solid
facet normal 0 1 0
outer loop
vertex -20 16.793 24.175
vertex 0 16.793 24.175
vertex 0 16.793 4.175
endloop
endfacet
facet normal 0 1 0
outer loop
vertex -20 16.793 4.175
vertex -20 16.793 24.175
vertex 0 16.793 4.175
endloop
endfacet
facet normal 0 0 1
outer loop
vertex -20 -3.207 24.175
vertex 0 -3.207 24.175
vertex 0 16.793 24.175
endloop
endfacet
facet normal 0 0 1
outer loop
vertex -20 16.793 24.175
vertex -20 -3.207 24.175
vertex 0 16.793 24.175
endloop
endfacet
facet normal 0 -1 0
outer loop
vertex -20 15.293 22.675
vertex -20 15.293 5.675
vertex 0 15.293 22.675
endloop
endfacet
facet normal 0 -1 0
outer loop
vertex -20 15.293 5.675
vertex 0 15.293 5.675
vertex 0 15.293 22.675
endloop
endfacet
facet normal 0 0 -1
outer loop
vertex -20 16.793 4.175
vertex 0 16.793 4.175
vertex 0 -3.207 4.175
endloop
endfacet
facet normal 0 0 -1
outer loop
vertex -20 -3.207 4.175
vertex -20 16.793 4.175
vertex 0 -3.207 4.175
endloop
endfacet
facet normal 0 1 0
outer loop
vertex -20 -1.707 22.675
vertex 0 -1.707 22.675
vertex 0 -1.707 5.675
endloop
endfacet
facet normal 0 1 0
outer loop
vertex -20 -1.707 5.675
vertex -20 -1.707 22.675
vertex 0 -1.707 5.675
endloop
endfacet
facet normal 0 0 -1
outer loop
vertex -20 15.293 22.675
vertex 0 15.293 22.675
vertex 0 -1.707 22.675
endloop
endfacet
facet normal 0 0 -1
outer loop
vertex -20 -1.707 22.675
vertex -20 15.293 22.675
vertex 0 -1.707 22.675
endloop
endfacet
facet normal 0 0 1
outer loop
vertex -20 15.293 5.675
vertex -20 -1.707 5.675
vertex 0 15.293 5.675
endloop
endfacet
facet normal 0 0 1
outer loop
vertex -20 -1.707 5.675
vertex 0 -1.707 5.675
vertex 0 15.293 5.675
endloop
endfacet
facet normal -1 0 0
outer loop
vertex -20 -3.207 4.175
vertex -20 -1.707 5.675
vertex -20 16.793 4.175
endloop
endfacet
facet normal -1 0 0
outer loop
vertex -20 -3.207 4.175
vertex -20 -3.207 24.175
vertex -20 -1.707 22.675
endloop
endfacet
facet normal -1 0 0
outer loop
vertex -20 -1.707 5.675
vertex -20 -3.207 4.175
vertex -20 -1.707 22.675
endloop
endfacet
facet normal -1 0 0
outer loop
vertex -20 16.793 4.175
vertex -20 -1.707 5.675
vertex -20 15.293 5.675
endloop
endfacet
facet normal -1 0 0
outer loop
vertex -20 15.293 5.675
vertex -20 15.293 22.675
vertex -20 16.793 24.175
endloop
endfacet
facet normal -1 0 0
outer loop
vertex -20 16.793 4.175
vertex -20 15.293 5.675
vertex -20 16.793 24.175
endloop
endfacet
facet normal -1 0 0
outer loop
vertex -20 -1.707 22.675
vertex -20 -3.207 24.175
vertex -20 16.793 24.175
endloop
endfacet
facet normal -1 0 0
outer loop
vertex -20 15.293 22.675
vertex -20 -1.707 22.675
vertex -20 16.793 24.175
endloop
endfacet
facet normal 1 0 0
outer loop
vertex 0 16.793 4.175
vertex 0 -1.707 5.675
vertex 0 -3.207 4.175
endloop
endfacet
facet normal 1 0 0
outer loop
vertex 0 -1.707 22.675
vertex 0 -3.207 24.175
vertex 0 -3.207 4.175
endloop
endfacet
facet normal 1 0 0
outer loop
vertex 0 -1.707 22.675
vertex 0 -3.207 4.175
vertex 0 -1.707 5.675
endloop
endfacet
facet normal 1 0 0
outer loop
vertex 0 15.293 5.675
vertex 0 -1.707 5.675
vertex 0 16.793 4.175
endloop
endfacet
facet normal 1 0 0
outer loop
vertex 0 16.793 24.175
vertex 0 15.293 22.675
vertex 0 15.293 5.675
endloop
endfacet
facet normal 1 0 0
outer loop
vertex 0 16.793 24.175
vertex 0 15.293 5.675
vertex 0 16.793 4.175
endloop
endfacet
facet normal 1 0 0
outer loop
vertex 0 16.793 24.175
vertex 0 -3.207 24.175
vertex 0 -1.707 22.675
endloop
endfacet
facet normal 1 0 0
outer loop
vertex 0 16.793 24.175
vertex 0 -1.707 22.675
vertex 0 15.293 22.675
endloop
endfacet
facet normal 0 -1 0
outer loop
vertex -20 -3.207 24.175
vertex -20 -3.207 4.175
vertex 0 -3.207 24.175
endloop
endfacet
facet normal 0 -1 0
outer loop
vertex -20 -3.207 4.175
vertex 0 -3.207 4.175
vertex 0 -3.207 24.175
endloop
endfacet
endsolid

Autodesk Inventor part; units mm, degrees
ref_plane "YZ Plane" through (0, 0, 0) normal (1, 0, 0) x (0, 1, 0)
ref_plane "XZ Plane" through (0, 0, 0) normal (0, 1, 0) x (-1, 0, 0)
ref_plane "XY Plane" through (0, 0, 0) normal (0, 0, 1) x (1, 0, 0)
sketch "Эскиз1" plane through (0, 0, 0) normal (1, 0, 0) x (0, 1, 0)
  line L0 (16.7932, 4.1754) -> (-3.2068, 4.1754) projected
  line L1 (-3.2068, 4.1754) -> (-3.2068, 24.1754)
  line L2 (-3.2068, 24.1754) -> (16.7932, 24.1754)
  line L3 (16.7932, 24.1754) -> (16.7932, 4.1754)
  line L4 (-1.7068, 5.6754) -> (15.2932, 5.6754)
  line L5 (15.2932, 5.6754) -> (15.2932, 22.6754)
  line L6 (15.2932, 22.6754) -> (-1.7068, 22.6754)
  line L7 (-1.7068, 22.6754) -> (-1.7068, 5.6754)
  point P0 (6.7932, 5.6754)
  point P1 (6.7932, 4.1754)
  dimension "d1" = 20
  dimension "d2" = 1.5
  dimension "d3" = 1.5
extrude "Выдавливание1" add sketch "Эскиз1" against normal blind 20
properties part number "arm"
